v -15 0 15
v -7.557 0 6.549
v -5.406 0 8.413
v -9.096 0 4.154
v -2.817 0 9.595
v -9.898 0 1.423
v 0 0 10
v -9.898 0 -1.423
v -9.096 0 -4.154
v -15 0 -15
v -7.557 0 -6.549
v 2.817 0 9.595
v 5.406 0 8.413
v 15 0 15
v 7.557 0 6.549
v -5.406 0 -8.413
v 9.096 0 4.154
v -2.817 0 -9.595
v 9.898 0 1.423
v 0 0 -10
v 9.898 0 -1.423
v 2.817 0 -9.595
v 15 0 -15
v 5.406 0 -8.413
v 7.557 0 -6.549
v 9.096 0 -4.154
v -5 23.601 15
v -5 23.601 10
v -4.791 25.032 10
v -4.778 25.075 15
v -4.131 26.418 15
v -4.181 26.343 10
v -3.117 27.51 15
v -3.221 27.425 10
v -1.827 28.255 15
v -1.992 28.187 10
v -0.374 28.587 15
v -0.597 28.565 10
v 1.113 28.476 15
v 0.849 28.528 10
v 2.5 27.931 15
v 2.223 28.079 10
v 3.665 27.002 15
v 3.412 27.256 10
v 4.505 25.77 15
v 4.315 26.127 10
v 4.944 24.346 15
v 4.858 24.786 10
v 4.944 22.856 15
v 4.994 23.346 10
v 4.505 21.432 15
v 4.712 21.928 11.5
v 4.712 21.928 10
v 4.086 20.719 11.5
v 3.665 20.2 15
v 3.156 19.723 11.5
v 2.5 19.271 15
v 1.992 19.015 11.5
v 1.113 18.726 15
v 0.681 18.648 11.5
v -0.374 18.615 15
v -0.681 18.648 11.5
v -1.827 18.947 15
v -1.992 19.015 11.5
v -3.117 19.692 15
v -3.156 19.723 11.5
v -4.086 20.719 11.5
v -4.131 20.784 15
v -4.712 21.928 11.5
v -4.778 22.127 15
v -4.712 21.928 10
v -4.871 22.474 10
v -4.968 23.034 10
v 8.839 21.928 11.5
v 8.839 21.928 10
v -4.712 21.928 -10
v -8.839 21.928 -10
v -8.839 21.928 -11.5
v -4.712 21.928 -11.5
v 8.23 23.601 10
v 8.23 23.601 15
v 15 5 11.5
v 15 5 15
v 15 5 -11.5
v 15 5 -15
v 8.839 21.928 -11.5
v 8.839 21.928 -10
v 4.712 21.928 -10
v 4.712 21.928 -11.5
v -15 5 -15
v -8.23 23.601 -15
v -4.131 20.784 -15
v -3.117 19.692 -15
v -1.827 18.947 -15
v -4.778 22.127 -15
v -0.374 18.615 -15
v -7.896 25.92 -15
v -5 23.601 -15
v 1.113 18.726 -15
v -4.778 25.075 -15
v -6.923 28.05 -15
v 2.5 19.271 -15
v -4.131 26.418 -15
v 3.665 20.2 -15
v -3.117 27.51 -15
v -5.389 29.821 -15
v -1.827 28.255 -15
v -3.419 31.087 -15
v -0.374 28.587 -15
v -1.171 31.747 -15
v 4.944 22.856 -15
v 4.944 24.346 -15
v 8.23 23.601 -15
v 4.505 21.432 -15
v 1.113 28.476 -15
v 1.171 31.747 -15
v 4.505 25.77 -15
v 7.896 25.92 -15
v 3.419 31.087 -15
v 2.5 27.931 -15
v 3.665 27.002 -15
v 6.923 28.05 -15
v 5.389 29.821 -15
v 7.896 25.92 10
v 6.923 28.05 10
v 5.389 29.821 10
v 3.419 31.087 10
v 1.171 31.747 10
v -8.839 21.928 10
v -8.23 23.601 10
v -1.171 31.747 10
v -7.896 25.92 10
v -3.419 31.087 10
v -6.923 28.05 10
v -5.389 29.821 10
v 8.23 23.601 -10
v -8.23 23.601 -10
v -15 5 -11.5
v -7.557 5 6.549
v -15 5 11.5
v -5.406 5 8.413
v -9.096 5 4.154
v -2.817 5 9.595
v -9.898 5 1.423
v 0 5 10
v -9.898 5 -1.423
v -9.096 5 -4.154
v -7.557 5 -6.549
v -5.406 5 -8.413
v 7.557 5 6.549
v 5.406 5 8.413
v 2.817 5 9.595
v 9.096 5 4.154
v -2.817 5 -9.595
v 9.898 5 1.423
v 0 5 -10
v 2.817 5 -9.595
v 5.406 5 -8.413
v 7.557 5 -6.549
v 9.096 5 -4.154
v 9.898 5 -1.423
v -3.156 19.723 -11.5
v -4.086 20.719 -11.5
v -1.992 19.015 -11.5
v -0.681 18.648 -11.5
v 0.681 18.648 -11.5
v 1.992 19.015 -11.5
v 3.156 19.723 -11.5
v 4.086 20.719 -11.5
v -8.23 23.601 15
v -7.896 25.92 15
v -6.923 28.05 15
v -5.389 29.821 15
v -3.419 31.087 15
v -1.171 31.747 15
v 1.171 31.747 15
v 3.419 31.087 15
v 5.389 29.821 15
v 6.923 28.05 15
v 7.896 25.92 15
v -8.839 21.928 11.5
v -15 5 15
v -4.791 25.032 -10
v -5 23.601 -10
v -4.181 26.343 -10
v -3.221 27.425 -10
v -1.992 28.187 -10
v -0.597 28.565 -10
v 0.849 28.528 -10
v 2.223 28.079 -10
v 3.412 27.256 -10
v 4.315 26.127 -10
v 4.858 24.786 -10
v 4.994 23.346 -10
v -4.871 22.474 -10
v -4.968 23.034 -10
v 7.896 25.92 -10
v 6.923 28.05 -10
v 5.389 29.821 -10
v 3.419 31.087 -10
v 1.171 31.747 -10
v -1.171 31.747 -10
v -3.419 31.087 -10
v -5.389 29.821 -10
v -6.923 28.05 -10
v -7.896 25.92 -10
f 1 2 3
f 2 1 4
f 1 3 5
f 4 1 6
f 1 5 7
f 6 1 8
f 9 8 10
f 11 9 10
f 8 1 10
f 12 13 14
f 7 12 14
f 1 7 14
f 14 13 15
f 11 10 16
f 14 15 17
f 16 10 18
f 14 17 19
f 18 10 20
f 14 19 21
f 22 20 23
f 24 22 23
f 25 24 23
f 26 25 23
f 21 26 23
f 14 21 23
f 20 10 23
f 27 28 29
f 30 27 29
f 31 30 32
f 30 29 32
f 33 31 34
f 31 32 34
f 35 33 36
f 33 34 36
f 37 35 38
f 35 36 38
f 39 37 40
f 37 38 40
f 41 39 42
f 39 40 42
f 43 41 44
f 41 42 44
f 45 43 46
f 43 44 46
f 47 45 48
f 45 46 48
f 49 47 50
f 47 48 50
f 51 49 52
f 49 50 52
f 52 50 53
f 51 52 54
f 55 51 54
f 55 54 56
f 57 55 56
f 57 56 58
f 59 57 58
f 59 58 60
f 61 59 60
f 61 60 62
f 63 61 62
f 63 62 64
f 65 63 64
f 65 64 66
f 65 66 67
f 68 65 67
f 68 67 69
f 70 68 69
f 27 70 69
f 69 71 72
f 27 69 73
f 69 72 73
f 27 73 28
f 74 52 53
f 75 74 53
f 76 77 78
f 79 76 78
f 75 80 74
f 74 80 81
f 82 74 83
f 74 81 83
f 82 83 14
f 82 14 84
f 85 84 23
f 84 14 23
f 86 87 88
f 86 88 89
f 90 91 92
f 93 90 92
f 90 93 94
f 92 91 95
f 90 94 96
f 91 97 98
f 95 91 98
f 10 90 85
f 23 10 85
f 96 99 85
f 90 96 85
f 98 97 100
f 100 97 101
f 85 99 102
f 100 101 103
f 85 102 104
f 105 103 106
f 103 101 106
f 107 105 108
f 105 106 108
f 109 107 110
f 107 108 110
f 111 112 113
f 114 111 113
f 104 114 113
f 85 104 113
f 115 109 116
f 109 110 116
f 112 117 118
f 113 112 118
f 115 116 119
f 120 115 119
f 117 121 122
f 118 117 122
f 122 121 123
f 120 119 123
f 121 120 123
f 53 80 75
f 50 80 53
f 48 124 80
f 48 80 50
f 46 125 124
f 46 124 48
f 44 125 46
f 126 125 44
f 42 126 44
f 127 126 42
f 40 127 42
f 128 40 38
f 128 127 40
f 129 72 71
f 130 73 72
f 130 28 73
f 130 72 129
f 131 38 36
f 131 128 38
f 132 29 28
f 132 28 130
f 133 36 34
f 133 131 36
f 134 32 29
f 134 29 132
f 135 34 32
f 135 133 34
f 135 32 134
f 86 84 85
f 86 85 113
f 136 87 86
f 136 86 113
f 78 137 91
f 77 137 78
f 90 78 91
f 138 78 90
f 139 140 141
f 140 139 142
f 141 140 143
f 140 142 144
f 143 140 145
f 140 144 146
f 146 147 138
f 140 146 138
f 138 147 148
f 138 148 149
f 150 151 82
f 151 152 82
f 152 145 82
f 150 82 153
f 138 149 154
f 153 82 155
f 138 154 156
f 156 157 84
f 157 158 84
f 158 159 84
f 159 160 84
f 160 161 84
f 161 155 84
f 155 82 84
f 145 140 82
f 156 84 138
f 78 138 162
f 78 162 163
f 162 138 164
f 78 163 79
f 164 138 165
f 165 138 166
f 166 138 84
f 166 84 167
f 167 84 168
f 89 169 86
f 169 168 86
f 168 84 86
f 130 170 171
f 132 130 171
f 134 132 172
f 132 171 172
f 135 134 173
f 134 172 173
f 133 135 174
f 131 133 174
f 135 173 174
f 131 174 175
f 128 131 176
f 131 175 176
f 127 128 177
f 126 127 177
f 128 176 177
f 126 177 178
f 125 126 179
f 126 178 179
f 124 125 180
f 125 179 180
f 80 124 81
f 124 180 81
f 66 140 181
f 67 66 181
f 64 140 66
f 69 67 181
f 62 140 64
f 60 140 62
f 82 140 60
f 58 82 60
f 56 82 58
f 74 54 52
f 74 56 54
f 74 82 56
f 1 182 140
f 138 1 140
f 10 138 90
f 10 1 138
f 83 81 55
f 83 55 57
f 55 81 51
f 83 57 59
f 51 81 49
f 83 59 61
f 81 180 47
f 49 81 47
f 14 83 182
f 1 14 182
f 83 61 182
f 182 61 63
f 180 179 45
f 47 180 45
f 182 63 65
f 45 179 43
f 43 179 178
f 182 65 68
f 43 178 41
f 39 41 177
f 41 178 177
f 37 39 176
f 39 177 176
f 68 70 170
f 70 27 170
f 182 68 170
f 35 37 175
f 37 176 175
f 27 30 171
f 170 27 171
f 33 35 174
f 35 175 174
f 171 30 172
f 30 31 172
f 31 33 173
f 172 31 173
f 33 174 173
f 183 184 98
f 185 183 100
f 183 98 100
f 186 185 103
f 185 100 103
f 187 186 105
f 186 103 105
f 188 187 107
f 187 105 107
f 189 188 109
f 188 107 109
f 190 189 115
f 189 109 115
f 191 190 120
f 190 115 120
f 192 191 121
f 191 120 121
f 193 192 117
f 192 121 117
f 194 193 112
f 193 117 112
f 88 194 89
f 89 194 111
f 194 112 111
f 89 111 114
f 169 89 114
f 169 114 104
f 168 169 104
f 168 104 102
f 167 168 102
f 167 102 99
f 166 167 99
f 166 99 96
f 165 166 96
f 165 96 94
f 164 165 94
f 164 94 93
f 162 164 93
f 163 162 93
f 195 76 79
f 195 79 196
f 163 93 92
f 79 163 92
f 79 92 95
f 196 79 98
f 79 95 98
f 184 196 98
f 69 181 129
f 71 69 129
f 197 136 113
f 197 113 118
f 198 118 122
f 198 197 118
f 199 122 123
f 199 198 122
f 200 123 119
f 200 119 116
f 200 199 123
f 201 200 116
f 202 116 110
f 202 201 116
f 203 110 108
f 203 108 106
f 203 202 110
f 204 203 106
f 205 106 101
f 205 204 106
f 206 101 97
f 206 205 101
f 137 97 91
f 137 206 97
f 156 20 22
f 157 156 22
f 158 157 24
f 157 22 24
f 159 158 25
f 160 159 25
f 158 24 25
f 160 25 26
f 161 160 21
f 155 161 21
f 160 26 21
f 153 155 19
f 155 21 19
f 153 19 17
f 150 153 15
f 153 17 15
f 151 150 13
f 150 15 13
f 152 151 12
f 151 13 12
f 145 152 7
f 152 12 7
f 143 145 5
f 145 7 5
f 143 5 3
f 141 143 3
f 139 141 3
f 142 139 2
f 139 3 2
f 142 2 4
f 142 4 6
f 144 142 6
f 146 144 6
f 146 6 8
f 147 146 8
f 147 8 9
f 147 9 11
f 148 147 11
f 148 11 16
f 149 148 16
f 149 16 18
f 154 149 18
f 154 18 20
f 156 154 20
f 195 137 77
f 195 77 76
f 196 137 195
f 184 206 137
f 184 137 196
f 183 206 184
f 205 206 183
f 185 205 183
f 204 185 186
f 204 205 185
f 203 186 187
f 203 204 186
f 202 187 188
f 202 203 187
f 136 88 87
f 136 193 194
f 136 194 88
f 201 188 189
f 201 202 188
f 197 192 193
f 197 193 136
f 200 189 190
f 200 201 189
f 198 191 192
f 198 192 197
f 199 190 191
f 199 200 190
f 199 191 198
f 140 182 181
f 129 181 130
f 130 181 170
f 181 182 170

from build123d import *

# Parameters (mm, degrees)
SKETCH1_W           = 30
SKETCH1_H           = 30
BOSS_EXTRUDE1_DEPTH = 5
BOSS_EXTRUDE2_DEPTH = 5
BOSS_EXTRUDE3_START = -5
BOSS_EXTRUDE3_DEPTH = 5
SKETCH6_R           = 5
CUT_EXTRUDE1_DEPTH  = 38
SKETCH7_R           = 10
CUT_EXTRUDE2_DEPTH  = 5
SKETCH8_W           = 23.0008229
SKETCH8_H           = 16.927991413
CUT_EXTRUDE3_DEPTH  = 30


with BuildPart() as part:
    # Sketch1 → Boss-Extrude1 (new body)
    with BuildSketch(Plane(origin=(0, 0, 0), x_dir=(1, 0, 0), z_dir=(0, 1, 0))):
        Rectangle(SKETCH1_W, SKETCH1_H)
    extrude(amount=BOSS_EXTRUDE1_DEPTH)

    # Sketch3 → Boss-Extrude2 (add)
    with BuildSketch(Plane.XY.offset(15)):
        with BuildLine():
            Line((-15, 5), (-8.229784678, 23.601013721))
            ThreePointArc((-8.229784678, 23.601013721), (0, 31.830798399), (8.229784678, 23.601013721))
            Line((8.229784678, 23.601013721), (15, 5))
            Line((15, 5), (-15, 5))
        make_face()
    extrude(amount=-BOSS_EXTRUDE2_DEPTH)

    # Sketch5 → Boss-Extrude3 (add)
    with BuildSketch(Plane(origin=(0, 0, -15), x_dir=(-1, 0, 0), z_dir=(0, 0, -1)).offset(BOSS_EXTRUDE3_START)):
        with BuildLine():
            Line((-15, 5), (-8.229784678, 23.601013721))
            ThreePointArc((-8.229784678, 23.601013721), (0, 31.830798399), (8.229784678, 23.601013721))
            Line((8.229784678, 23.601013721), (15, 5))
            Line((15, 5), (-15, 5))
        make_face()
    extrude(amount=BOSS_EXTRUDE3_DEPTH)

    # Sketch6 → Cut-Extrude1 (cut)
    with BuildSketch(Plane(origin=(0, 0, -15), x_dir=(-1, 0, 0), z_dir=(0, 0, -1))):
        with Locations((0, 23.601013721)):
            Circle(SKETCH6_R)
    extrude(amount=-CUT_EXTRUDE1_DEPTH, mode=Mode.SUBTRACT)

    # Sketch7 → Cut-Extrude2 (cut)
    with BuildSketch(Plane.XZ):
        with Locations(Location((0, 0, 0), (0, 0, 270))):
            Circle(SKETCH7_R)
    extrude(amount=-CUT_EXTRUDE2_DEPTH, mode=Mode.SUBTRACT)

    # Sketch8 → Cut-Extrude3 (cut)
    with BuildSketch(Plane(origin=(15, 0, 0), x_dir=(0, 0, -1), z_dir=(1, 0, 0))):
        with Locations((0, 13.463995707)):
            Rectangle(SKETCH8_W, SKETCH8_H)
    extrude(amount=-CUT_EXTRUDE3_DEPTH, mode=Mode.SUBTRACT)


solid = part.part
